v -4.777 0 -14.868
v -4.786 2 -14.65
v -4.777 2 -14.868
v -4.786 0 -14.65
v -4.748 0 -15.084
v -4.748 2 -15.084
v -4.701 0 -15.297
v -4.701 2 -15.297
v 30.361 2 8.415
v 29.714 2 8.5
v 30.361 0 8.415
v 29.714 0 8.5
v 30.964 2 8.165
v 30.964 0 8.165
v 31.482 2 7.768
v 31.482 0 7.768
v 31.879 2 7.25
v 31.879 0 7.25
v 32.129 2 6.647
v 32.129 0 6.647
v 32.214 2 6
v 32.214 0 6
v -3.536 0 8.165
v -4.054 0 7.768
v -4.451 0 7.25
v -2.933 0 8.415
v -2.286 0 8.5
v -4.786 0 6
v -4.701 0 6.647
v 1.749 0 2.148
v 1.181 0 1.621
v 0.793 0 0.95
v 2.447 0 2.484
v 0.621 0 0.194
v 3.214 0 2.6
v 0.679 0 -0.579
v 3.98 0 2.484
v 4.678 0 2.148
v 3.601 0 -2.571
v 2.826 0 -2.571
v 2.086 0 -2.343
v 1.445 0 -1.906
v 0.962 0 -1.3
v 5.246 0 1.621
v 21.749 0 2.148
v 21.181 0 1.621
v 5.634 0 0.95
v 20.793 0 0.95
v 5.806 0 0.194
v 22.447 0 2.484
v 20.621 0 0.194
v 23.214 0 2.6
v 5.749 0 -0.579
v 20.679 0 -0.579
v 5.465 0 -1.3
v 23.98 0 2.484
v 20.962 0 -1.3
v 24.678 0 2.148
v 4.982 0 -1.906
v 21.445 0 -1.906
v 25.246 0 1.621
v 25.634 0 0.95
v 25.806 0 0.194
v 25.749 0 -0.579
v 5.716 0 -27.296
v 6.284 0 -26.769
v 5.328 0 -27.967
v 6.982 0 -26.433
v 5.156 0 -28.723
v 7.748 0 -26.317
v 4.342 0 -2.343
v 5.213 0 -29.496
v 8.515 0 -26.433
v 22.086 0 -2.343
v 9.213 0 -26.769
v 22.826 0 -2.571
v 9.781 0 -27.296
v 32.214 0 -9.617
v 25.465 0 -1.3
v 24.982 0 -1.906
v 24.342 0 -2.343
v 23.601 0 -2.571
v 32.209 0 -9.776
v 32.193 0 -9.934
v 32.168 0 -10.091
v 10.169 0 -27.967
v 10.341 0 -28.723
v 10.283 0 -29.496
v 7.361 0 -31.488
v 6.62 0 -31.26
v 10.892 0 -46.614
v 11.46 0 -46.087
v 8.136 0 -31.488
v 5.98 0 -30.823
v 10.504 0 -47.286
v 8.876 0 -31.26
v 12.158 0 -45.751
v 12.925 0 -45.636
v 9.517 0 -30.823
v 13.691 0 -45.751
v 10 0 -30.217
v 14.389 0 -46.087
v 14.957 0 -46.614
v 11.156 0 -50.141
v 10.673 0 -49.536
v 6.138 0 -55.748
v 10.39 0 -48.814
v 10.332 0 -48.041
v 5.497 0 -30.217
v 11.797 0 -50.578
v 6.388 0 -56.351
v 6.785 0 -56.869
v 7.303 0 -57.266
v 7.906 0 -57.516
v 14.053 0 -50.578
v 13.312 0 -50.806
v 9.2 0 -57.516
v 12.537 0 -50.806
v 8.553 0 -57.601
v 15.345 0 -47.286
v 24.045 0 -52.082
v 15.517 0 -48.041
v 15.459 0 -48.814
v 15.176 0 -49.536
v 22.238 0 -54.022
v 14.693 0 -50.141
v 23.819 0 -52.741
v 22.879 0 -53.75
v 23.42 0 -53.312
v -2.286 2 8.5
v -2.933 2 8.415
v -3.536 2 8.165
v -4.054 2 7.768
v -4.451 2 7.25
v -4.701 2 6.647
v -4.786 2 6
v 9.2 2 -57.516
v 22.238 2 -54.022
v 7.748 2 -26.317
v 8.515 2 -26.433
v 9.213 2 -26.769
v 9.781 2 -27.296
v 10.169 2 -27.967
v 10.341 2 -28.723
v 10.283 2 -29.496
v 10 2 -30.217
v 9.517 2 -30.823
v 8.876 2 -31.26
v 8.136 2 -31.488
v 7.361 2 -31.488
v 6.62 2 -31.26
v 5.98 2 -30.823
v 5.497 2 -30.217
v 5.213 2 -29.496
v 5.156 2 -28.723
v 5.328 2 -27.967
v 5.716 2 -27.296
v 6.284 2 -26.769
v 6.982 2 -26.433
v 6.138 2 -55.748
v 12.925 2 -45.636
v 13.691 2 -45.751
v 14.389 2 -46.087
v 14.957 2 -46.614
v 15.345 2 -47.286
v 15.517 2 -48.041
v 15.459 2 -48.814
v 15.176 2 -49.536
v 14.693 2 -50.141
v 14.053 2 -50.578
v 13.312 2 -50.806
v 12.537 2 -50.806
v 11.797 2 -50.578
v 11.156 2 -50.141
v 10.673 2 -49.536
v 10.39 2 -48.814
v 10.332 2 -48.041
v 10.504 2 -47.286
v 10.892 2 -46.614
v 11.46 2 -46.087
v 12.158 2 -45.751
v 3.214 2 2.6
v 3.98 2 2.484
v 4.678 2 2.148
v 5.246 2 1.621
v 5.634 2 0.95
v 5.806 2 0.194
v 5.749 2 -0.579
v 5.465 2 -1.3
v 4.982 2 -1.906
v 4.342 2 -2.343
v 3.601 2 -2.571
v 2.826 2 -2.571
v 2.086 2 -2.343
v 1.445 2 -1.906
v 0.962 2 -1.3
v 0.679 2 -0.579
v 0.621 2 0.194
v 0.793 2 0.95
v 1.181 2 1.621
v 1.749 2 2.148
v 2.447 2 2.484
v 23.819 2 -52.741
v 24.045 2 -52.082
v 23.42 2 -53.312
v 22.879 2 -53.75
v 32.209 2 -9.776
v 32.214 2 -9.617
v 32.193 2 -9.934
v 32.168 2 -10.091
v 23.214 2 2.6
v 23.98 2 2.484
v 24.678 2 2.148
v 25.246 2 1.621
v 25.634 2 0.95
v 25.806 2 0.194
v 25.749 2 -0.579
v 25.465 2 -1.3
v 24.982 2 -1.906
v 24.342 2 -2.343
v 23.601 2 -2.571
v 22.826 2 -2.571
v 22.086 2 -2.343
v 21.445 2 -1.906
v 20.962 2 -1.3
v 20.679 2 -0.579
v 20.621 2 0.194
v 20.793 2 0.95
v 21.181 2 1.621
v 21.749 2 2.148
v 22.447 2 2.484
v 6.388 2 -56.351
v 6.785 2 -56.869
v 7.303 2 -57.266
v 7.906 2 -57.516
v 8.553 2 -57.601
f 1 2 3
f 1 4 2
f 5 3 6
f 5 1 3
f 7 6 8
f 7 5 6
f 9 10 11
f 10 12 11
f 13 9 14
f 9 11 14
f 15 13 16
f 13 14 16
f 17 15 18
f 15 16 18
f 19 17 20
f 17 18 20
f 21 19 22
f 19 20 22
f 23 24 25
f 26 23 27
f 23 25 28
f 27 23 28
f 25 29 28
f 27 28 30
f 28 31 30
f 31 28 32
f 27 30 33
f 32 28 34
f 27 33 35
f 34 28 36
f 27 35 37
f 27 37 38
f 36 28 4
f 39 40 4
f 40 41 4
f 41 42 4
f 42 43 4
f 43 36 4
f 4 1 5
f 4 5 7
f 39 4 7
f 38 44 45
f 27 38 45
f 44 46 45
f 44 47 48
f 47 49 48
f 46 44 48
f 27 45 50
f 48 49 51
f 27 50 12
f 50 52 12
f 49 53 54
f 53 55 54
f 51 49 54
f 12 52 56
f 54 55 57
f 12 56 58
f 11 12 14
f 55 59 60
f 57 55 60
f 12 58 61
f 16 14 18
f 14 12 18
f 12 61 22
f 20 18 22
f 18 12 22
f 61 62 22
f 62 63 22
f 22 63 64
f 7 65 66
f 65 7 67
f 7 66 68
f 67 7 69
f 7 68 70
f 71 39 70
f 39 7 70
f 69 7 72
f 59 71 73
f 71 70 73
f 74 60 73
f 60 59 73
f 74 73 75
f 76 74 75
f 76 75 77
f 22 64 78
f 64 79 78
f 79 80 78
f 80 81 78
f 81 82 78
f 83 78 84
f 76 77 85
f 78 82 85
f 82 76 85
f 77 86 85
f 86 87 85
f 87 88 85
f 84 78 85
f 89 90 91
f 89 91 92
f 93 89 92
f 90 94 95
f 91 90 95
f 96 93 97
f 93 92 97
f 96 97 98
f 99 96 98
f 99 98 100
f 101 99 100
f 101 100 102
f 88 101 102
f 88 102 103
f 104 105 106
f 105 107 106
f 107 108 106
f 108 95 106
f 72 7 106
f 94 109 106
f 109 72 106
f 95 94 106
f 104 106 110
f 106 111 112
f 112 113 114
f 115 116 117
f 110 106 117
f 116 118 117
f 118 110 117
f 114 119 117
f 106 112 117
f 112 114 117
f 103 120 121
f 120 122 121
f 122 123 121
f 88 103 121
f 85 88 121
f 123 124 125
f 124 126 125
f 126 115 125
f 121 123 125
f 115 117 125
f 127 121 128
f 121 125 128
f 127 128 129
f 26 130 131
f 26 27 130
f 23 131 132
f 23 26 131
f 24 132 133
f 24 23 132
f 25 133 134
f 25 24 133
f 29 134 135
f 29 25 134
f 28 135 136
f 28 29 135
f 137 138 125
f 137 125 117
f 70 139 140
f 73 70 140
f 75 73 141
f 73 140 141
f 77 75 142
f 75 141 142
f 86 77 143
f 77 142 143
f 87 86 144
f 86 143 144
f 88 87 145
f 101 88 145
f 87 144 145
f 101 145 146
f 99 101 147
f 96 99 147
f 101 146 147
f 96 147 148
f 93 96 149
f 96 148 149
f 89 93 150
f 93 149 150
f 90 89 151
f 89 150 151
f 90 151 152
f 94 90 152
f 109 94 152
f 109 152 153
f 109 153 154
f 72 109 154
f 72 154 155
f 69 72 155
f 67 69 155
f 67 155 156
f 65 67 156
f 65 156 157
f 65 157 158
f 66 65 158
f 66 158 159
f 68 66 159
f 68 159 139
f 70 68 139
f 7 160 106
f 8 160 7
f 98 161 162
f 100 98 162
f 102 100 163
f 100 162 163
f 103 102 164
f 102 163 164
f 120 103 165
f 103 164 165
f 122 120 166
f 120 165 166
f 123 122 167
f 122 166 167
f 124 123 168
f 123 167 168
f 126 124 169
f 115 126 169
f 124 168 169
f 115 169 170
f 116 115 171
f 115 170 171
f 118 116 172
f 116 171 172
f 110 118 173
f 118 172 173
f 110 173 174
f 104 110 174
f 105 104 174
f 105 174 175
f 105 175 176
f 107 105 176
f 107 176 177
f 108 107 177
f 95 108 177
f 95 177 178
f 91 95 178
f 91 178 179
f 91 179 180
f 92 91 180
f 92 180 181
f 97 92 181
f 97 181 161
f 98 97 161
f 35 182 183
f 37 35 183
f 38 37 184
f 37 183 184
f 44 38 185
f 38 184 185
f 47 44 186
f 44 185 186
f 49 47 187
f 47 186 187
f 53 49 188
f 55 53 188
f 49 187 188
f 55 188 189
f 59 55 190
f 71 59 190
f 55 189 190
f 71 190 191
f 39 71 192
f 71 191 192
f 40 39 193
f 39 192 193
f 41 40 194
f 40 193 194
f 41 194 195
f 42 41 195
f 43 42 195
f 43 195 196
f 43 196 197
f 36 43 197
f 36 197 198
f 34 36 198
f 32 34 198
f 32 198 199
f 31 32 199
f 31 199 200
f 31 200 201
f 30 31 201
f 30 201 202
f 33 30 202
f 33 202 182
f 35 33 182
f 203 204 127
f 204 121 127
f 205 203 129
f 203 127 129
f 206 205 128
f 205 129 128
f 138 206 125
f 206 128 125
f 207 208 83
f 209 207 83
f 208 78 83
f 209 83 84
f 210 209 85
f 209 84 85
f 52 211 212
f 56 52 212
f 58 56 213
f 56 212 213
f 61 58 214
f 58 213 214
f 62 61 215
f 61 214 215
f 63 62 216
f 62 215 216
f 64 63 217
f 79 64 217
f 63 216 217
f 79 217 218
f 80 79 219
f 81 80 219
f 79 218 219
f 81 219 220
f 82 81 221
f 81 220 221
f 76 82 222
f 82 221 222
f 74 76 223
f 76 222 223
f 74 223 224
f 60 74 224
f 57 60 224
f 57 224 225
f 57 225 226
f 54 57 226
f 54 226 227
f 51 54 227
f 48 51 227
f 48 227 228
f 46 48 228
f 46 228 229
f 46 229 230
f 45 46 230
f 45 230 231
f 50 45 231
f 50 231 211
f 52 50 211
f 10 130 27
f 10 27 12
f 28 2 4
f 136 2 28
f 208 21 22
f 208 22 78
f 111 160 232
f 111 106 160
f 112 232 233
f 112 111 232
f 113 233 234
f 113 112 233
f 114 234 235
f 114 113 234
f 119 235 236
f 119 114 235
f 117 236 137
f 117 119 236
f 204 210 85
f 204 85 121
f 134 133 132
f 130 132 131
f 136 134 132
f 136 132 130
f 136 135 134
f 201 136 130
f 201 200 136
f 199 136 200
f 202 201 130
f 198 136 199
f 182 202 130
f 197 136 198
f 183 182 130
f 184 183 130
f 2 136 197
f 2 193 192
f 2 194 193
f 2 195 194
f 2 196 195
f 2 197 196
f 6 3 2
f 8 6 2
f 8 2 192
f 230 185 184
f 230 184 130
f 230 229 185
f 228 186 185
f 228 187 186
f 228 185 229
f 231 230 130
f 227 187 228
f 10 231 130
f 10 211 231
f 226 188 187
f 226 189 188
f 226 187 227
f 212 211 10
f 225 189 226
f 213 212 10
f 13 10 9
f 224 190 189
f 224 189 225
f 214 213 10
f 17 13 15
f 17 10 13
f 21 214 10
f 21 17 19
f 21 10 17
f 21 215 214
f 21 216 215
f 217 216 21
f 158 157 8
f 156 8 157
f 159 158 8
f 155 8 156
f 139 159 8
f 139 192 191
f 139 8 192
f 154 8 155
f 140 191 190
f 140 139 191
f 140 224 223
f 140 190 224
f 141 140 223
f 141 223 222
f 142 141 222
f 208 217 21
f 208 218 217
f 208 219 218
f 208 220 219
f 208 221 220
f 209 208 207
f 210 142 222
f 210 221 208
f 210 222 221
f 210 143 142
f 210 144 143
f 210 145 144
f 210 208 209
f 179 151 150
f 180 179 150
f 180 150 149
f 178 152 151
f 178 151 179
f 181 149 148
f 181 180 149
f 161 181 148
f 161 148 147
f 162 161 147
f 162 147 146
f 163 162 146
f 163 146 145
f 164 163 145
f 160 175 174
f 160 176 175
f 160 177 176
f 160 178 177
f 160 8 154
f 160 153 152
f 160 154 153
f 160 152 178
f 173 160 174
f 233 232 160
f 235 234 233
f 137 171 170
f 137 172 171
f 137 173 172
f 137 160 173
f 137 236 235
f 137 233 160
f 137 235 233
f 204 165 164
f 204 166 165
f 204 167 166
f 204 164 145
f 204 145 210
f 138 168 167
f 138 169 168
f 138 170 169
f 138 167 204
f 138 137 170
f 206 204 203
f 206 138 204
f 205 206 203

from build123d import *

# Parameters (mm, degrees)
EXTRUDE_1_DEPTH     = 2
SKETCH_7_OUTSIDE_W  = 58.13
SKETCH_7_OUTSIDE_H  = 88.13
CUT_EXTRUDE_5_DEPTH = 3
SKETCH_3_R          = 2.6
CUT_EXTRUDE_1_DEPTH = 3
FILLET_1_R          = 2.5


with BuildPart() as part:
    # Эскиз2 → Бобышка-Вытянуть1 (new body)
    with BuildSketch(Plane(origin=(0, 0, 0), x_dir=(1, 0, 0), z_dir=(0, 1, 0))):
        Polygon((33.713737203, -10), (33.713737203, 10), (25.042706268, 54.823619098), (5.724189742, 60), (-6.286262797, 15.176380902), (-6.286262797, -10), align=None)
    extrude(amount=EXTRUDE_1_DEPTH)

    # Эскиз7 outside → Вырез-Вытянуть5 (cut, through all)
    with BuildSketch(Plane(origin=(0, 2, 0), x_dir=(1, 0, 0), z_dir=(0, 1, 0))):
        with Locations((13.714, 25)):
            Rectangle(SKETCH_7_OUTSIDE_W, SKETCH_7_OUTSIDE_H)
        Polygon((32.213737203, -8.5), (32.213737203, 9.856246677), (23.748206001, 53.617565128), (6.784849914, 58.162882693), (-4.786262797, 14.978902156), (-4.786262797, -8.5), align=None, mode=Mode.SUBTRACT)
    extrude(amount=-CUT_EXTRUDE_5_DEPTH, mode=Mode.SUBTRACT)

    # Эскиз3 → Вырез-Вытянуть1 (cut, through all)
    with BuildSketch(Plane(origin=(0, 2, 0), x_dir=(1, 0, 0), z_dir=(0, 1, 0))):
        with Locations(Location((3.213737203, 0, 0), (0, 0, 270))):  # turned: the seam where the file's is
            Circle(SKETCH_3_R)
        with Locations(Location((7.748286174, 28.916997673, 0), (0, 0, 270))):  # turned: the seam where the file's is
            Circle(SKETCH_3_R)
        with Locations(Location((12.924667076, 48.235514199, 0), (0, 0, 270))):  # turned: the seam where the file's is
            Circle(SKETCH_3_R)
        with Locations(Location((23.213737203, 0, 0), (0, 0, 270))):  # turned: the seam where the file's is
            Circle(SKETCH_3_R)
        with Locations((43.213737203, 0)):
            Circle(SKETCH_3_R)
    extrude(amount=-CUT_EXTRUDE_1_DEPTH, mode=Mode.SUBTRACT)

    # Скругление1
    fillet_1_edges = [part.edges().sort_by_distance(p)[0] for p in [
        (6.784849914, 1, -58.162882693),
        (23.748206001, 1, -53.617565128),
        (32.213737203, 1, -9.856246677),
        (32.213737203, 1, 8.5),
        (-4.786262797, 1, 8.5),
        (-4.786262797, 1, -14.978902156),
    ]]
    fillet(fillet_1_edges, radius=FILLET_1_R)


solid = part.part
